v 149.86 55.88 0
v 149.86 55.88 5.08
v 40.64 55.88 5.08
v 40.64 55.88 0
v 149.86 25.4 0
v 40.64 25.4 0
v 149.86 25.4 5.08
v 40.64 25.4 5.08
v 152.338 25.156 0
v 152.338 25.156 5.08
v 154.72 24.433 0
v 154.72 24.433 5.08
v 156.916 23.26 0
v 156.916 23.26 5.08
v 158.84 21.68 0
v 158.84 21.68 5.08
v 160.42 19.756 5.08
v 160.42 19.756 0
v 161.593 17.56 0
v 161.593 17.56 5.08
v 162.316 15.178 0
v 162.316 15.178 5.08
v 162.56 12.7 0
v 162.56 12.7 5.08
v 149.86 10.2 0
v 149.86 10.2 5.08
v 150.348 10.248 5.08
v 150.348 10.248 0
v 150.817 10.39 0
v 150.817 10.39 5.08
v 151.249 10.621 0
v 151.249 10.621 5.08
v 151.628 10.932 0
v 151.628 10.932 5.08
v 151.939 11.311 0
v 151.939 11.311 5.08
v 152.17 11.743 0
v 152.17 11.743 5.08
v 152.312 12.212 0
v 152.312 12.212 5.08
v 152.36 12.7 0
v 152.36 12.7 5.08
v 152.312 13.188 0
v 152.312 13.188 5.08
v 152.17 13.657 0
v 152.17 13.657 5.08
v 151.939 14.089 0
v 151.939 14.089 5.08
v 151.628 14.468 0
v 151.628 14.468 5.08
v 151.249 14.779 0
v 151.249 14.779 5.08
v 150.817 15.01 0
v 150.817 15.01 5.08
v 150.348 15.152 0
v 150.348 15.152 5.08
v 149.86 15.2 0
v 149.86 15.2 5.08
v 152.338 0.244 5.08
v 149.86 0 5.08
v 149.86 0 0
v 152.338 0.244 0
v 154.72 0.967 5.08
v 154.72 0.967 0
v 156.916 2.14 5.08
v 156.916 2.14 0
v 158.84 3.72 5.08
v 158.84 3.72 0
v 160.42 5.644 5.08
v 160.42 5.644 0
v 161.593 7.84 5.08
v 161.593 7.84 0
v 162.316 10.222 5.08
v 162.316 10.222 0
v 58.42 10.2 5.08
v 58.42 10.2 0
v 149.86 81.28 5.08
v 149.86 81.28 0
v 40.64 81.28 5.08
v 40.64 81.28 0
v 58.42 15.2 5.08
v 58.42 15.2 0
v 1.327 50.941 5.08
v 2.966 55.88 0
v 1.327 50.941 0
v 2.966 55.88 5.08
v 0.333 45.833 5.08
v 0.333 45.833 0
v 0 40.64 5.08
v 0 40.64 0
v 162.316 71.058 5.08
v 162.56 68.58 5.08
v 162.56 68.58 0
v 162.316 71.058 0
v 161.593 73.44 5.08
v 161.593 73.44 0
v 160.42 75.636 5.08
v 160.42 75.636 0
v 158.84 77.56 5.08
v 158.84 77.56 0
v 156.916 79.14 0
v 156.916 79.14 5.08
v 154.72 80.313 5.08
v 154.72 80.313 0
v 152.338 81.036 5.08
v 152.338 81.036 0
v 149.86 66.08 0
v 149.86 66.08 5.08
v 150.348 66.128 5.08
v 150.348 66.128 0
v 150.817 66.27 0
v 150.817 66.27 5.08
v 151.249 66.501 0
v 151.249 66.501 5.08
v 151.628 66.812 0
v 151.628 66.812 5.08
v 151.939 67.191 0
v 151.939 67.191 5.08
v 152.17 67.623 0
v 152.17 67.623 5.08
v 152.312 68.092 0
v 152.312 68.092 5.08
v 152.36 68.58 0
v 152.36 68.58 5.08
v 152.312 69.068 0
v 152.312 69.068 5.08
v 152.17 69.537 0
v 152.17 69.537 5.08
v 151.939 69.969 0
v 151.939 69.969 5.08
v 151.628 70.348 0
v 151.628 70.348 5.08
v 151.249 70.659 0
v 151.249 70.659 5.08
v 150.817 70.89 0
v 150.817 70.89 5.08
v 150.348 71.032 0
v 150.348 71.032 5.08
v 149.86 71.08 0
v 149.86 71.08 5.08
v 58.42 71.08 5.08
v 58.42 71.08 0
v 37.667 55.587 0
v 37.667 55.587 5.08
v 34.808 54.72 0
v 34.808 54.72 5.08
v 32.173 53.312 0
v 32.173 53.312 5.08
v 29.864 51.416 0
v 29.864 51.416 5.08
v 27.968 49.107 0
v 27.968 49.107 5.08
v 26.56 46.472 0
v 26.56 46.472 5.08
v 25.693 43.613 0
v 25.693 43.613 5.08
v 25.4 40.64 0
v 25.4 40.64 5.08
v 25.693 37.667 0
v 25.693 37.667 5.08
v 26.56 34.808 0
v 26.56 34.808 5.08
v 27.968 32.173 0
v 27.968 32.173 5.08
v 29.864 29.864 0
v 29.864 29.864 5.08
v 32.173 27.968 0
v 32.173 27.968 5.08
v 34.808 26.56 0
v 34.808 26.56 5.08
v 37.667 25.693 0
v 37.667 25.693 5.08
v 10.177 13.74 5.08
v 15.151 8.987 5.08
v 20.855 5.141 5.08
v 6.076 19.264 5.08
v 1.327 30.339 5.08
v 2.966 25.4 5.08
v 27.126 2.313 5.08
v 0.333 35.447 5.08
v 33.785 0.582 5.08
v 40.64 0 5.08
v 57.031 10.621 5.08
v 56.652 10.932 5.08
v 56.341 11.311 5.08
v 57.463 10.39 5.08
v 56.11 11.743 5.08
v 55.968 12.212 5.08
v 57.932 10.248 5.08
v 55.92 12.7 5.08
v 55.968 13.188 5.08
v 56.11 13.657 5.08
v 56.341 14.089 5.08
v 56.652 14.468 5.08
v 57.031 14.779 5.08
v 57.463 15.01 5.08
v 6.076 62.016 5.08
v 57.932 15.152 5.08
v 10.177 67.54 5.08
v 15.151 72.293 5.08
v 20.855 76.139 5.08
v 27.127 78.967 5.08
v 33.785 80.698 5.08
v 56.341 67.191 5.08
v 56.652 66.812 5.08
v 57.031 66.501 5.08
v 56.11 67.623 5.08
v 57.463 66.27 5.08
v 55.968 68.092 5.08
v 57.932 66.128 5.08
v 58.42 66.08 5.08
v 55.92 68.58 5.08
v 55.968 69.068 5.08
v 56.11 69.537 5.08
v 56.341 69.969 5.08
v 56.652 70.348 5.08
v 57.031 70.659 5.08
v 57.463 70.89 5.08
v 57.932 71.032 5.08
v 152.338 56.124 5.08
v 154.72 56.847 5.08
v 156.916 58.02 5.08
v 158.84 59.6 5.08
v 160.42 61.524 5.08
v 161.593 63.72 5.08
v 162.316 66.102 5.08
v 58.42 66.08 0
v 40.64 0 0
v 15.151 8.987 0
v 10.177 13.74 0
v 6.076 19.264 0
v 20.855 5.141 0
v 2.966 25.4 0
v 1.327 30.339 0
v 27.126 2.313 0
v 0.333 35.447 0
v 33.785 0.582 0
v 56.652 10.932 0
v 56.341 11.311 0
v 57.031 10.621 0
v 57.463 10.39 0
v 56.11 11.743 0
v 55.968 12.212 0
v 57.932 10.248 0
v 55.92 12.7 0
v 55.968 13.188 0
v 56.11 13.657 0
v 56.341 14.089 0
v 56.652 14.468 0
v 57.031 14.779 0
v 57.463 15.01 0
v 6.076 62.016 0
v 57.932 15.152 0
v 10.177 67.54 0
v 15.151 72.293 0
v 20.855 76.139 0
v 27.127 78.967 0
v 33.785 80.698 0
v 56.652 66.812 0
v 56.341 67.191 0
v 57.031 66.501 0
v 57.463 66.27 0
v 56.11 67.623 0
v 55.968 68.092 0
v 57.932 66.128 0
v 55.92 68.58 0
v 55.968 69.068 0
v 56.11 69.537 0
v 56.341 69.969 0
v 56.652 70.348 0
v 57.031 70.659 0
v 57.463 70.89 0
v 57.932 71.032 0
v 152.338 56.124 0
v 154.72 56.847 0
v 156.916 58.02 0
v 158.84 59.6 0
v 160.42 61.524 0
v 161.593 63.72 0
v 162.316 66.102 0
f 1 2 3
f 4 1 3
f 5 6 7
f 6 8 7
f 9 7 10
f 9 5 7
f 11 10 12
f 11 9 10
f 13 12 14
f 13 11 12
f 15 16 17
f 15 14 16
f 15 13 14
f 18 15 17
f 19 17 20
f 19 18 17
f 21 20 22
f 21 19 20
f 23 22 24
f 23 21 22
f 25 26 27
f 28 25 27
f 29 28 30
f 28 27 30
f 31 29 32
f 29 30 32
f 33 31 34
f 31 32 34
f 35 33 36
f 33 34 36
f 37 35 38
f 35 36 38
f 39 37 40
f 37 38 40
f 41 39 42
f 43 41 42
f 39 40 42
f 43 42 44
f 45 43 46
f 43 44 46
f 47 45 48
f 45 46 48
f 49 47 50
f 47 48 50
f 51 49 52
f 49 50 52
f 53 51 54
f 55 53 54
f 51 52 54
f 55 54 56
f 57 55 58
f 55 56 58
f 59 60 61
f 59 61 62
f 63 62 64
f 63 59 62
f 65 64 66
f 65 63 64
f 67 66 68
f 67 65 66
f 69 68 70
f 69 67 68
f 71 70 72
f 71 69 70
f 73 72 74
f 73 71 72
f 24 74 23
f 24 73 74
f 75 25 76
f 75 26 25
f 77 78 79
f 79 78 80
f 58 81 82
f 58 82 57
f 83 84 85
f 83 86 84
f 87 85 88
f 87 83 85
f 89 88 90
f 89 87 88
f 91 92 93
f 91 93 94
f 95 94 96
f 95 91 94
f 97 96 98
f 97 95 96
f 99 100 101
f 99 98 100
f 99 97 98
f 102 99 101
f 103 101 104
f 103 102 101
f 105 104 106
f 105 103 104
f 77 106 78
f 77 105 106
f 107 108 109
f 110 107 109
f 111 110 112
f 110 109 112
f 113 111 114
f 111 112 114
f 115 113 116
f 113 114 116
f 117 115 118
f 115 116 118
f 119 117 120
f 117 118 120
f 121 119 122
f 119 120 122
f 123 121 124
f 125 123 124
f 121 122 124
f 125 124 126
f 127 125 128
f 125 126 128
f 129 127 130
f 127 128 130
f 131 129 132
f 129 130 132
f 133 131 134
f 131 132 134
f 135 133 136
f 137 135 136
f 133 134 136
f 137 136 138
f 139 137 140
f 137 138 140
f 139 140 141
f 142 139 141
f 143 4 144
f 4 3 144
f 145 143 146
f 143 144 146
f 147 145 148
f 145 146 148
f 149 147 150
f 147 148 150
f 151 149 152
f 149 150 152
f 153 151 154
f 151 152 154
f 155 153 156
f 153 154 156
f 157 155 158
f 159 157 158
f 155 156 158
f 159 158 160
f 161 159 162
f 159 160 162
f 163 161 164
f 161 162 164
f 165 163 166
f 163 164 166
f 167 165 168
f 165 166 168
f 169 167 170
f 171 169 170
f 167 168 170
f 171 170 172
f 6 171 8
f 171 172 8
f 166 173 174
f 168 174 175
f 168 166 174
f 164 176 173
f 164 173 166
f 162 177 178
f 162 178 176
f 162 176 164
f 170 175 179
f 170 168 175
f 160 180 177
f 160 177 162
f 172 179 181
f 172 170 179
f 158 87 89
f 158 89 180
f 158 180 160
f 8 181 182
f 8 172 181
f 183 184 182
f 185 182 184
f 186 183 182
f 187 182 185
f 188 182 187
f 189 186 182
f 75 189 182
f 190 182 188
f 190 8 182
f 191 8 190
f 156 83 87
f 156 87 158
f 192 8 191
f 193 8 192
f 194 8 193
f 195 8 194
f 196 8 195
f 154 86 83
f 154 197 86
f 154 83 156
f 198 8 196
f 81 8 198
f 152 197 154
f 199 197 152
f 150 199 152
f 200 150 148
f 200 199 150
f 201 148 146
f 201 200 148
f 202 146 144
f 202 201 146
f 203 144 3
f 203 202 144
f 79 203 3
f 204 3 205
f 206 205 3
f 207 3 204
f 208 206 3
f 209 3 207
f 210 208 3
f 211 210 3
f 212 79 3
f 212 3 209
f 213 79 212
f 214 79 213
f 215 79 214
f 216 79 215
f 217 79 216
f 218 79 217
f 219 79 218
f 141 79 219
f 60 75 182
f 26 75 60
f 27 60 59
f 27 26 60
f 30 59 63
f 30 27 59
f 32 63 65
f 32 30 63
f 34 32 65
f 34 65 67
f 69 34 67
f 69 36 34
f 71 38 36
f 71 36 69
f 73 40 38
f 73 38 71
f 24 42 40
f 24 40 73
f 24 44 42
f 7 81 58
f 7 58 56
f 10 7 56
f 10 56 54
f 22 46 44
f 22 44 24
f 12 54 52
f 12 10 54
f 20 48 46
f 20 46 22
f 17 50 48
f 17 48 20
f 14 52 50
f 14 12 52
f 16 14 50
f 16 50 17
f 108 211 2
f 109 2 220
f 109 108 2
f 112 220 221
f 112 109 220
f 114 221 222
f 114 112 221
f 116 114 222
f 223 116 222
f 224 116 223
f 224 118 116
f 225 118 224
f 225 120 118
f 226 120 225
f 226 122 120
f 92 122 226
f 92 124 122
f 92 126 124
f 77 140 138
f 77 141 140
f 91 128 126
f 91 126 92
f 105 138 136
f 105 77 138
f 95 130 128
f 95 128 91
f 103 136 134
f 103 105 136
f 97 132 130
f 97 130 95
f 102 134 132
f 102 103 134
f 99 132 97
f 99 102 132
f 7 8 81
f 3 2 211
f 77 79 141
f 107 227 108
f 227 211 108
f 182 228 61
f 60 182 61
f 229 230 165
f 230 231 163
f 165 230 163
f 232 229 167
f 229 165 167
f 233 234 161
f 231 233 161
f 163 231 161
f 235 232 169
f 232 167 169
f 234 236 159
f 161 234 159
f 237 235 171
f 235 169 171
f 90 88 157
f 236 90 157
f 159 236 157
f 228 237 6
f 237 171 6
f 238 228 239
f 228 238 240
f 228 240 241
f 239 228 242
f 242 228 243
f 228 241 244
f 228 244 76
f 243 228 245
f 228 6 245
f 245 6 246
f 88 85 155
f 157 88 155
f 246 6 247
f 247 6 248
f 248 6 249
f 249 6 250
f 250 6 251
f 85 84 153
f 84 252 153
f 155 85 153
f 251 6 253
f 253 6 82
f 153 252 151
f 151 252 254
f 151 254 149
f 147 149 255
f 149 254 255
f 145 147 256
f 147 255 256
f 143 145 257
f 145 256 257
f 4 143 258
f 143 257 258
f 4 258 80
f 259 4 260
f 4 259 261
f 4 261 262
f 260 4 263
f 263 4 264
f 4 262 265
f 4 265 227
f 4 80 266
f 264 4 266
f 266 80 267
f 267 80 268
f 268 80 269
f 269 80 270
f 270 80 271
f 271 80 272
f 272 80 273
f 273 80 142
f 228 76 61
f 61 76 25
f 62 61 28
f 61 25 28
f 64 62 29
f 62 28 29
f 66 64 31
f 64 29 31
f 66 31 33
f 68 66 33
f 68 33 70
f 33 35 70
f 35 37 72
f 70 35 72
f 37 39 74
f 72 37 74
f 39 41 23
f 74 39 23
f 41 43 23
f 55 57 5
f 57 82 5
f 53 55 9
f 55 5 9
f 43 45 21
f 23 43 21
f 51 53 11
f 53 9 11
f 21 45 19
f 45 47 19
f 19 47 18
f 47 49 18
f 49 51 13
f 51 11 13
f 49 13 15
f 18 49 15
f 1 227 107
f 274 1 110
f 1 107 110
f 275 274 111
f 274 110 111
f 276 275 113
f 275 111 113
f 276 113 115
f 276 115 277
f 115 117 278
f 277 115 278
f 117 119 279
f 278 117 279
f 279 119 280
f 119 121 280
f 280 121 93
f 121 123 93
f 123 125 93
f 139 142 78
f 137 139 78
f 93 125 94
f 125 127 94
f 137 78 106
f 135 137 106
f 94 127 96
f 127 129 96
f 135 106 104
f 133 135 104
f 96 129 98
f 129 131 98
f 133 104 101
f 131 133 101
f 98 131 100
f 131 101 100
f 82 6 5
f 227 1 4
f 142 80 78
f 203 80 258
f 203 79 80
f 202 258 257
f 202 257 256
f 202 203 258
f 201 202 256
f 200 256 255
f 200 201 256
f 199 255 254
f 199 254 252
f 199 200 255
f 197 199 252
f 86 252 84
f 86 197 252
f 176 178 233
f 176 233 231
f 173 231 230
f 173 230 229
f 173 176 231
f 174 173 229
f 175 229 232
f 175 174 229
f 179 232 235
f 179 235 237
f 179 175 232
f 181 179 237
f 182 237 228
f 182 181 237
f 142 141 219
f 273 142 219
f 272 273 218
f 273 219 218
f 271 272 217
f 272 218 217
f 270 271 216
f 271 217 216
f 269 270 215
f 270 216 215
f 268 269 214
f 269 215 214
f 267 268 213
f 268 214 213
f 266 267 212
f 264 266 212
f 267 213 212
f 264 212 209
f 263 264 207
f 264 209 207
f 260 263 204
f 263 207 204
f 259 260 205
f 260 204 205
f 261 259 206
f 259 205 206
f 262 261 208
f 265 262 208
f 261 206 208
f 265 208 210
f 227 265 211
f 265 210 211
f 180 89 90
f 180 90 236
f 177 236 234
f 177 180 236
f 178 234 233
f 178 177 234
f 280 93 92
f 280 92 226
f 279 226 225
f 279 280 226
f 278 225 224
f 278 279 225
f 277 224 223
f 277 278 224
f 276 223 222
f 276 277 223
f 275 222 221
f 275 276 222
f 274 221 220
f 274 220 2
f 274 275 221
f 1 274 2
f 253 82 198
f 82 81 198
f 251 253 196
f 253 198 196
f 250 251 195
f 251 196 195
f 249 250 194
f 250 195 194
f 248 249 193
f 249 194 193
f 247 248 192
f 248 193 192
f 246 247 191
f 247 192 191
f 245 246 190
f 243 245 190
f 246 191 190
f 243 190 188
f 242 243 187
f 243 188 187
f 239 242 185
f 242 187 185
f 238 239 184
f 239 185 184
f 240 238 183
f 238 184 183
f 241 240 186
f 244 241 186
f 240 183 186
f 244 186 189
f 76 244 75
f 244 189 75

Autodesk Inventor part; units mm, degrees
ref_plane "YZ Plane" through (0, 0, 0) normal (1, 0, 0) x (0, 1, 0)
ref_plane "XZ Plane" through (0, 0, 0) normal (0, 1, 0) x (-1, 0, 0)
ref_plane "XY Plane" through (0, 0, 0) normal (0, 0, 1) x (1, 0, 0)
sketch "Sketch1" plane through (0, 0, 0) normal (0, 0, 1) x (1, 0, 0)
  line L0 (0, 0) -> (162.56, 0)
  line L1 (162.56, 0) -> (162.56, 81.28)
  line L2 (162.56, 81.28) -> (0, 81.28)
  line L3 (0, 81.28) -> (0, 0)
  dimension "d0" = 162.56
  dimension "d1" = 81.28
extrude "Extrusion1" add sketch "Sketch1" along normal blind 5.08
sketch "Sketch2" plane through (0, 0, 5.08) normal (0, 0, 1) x (1, 0, 0)
  line L0 (0, 0) -> (162.56, 0) projected
  line L1 (162.56, 0) -> (162.56, 81.28) projected
  line L2 (162.56, 81.28) -> (0, 81.28) projected
  line L3 (0, 81.28) -> (0, 0) construction
  line L4 (0, 40.64) -> (162.56, 40.64) construction
  arc A0 (40.64, 55.88) -> (40.64, 25.4) centre (40.64, 40.64) ccw
  arc A1 (78.3143, 55.88) -> (40.64, 81.28) centre (40.64, 40.64) ccw construction
  line L5 (0, 81.28) -> (0, 0) projected
  line L6 (0, 0) -> (162.56, 0) projected
  line L7 (0, 81.28) -> (40.64, 81.28) construction
  line L8 (162.56, 81.28) -> (162.56, 0)
  line L9 (162.56, 0) -> (40.64, 0)
  line L10 (0, 0) -> (0, 40.64)
  line L11 (0, 40.64) -> (0, 81.28)
  line L12 (40.64, 0) -> (0, 0) construction
  line L13 (40.64, 81.28) -> (162.56, 81.28)
  line L14 (40.64, 25.4) -> (78.3143, 25.4)
  line L15 (40.64, 55.88) -> (78.3143, 55.88)
  line L16 (162.56, 0) -> (162.56, 81.28) projected
  line L17 (162.56, 23.2866) -> (162.56, 55.88)
  line L18 (40.64, 25.4) -> (78.3143, 25.4)
  line L19 (162.56, 25.4) -> (162.56, 55.88) construction
  line L20 (162.56, 55.88) -> (40.64, 55.88)
  line L21 (40.64, 55.88) -> (40.64, 25.4) construction
  arc A2 (55.88, 40.64) -> (40.64, 55.88) centre (40.64, 40.64) ccw construction
  arc A3 (40.64, 25.4) -> (55.88, 40.64) centre (40.64, 40.64) ccw construction
  arc A4 (81.28, 40.64) -> (78.3143, 55.88) centre (40.64, 40.64) ccw construction
  arc A5 (78.3143, 25.4) -> (81.28, 40.64) centre (40.64, 40.64) ccw construction
  arc A6 (40.64, 81.28) -> (2.9657, 55.88) centre (40.64, 40.64) ccw
  arc A7 (40.64, 0) -> (78.3143, 25.4) centre (40.64, 40.64) ccw construction
  arc A8 (0, 40.64) -> (2.9657, 25.4) centre (40.64, 40.64) ccw
  arc A9 (2.9657, 25.4) -> (40.64, 0) centre (40.64, 40.64) ccw
  arc A10 (2.9657, 55.88) -> (0, 40.64) centre (40.64, 40.64) ccw
  line L22 (78.3143, 55.88) -> (162.56, 55.88)
  line L23 (78.3143, 25.4) -> (162.56, 25.4)
  line L24 (78.3143, 25.4) -> (162.56, 25.4)
  dimension "d4" = 30.48
extrude "Extrusion2" cut sketch "Sketch2" against normal blind 5.08 contours A9 A8 A10 A6 L2 L1 L20 L15 A0 L14 L23 L0 keep common part
sketch "Sketch3" plane through (0, 0, 5.08) normal (0, 0, 1) x (1, 0, 0)
  line L0 (162.56, 55.88) -> (40.64, 55.88) projected
  line L1 (162.56, 55.88) -> (162.56, 81.28) projected
  line L2 (162.56, 81.28) -> (40.64, 81.28) projected
  arc A0 (40.64, 81.28) -> (40.64, 0) centre (40.64, 40.64) ccw projected
  line L3 (40.64, 0) -> (162.56, 0) projected
  line L4 (162.56, 0) -> (162.56, 25.4) projected
  line L5 (40.64, 25.4) -> (162.56, 25.4) projected
  arc A1 (40.64, 55.88) -> (40.64, 25.4) centre (40.64, 40.64) ccw projected
  line L6 (40.64, 40.64) -> (162.56, 40.64) construction
  line L7 (162.56, 40.64) -> (162.56, 25.4) construction
  line L8 (58.42, 68.58) -> (149.86, 68.58) construction
  line L9 (58.42, 66.08) -> (149.86, 66.08)
  line L10 (149.86, 71.08) -> (58.42, 71.08)
  arc A2 (58.42, 71.08) -> (58.42, 66.08) centre (58.42, 68.58) ccw
  arc A3 (149.86, 66.08) -> (149.86, 71.08) centre (149.86, 68.58) ccw
  line L11 (40.64, 55.88) -> (40.64, 81.28) construction
  line L12 (58.42, 12.7) -> (149.86, 12.7) construction
  line L13 (58.42, 15.2) -> (149.86, 15.2)
  line L14 (149.86, 10.2) -> (58.42, 10.2)
  arc A4 (58.42, 15.2) -> (58.42, 10.2) centre (58.42, 12.7) ccw
  arc A5 (149.86, 10.2) -> (149.86, 15.2) centre (149.86, 12.7) ccw
  point P0 (0, 0)
  point P1 (104.14, 68.58)
  point P2 (104.14, 12.7)
  dimension "d7" = 2.5
  dimension "d8" = 121.92
  dimension "d10" = 25.4
  dimension "d11" = 12.7
  dimension "d12" = 91.44
  dimension "d13" = 12.7
extrude "Extrusion3" cut sketch "Sketch3" against normal blind 5.08 contours A2 L10 A3 L9 | L13 A5 L14 A4
fillet "Fillet1" radius 12.7 4 edges at (162.56, 0, 2.54) (162.56, 25.4, 2.54) (162.56, 55.88, 2.54) (162.56, 81.28, 2.54)
equation "\"d0\" = 2 * d1"
equation "\"d11\" = 0.5 * d10"
equation "\"d13\" = d11"
properties part number "SuctionGrabberA" material "Wood (Birch)"
